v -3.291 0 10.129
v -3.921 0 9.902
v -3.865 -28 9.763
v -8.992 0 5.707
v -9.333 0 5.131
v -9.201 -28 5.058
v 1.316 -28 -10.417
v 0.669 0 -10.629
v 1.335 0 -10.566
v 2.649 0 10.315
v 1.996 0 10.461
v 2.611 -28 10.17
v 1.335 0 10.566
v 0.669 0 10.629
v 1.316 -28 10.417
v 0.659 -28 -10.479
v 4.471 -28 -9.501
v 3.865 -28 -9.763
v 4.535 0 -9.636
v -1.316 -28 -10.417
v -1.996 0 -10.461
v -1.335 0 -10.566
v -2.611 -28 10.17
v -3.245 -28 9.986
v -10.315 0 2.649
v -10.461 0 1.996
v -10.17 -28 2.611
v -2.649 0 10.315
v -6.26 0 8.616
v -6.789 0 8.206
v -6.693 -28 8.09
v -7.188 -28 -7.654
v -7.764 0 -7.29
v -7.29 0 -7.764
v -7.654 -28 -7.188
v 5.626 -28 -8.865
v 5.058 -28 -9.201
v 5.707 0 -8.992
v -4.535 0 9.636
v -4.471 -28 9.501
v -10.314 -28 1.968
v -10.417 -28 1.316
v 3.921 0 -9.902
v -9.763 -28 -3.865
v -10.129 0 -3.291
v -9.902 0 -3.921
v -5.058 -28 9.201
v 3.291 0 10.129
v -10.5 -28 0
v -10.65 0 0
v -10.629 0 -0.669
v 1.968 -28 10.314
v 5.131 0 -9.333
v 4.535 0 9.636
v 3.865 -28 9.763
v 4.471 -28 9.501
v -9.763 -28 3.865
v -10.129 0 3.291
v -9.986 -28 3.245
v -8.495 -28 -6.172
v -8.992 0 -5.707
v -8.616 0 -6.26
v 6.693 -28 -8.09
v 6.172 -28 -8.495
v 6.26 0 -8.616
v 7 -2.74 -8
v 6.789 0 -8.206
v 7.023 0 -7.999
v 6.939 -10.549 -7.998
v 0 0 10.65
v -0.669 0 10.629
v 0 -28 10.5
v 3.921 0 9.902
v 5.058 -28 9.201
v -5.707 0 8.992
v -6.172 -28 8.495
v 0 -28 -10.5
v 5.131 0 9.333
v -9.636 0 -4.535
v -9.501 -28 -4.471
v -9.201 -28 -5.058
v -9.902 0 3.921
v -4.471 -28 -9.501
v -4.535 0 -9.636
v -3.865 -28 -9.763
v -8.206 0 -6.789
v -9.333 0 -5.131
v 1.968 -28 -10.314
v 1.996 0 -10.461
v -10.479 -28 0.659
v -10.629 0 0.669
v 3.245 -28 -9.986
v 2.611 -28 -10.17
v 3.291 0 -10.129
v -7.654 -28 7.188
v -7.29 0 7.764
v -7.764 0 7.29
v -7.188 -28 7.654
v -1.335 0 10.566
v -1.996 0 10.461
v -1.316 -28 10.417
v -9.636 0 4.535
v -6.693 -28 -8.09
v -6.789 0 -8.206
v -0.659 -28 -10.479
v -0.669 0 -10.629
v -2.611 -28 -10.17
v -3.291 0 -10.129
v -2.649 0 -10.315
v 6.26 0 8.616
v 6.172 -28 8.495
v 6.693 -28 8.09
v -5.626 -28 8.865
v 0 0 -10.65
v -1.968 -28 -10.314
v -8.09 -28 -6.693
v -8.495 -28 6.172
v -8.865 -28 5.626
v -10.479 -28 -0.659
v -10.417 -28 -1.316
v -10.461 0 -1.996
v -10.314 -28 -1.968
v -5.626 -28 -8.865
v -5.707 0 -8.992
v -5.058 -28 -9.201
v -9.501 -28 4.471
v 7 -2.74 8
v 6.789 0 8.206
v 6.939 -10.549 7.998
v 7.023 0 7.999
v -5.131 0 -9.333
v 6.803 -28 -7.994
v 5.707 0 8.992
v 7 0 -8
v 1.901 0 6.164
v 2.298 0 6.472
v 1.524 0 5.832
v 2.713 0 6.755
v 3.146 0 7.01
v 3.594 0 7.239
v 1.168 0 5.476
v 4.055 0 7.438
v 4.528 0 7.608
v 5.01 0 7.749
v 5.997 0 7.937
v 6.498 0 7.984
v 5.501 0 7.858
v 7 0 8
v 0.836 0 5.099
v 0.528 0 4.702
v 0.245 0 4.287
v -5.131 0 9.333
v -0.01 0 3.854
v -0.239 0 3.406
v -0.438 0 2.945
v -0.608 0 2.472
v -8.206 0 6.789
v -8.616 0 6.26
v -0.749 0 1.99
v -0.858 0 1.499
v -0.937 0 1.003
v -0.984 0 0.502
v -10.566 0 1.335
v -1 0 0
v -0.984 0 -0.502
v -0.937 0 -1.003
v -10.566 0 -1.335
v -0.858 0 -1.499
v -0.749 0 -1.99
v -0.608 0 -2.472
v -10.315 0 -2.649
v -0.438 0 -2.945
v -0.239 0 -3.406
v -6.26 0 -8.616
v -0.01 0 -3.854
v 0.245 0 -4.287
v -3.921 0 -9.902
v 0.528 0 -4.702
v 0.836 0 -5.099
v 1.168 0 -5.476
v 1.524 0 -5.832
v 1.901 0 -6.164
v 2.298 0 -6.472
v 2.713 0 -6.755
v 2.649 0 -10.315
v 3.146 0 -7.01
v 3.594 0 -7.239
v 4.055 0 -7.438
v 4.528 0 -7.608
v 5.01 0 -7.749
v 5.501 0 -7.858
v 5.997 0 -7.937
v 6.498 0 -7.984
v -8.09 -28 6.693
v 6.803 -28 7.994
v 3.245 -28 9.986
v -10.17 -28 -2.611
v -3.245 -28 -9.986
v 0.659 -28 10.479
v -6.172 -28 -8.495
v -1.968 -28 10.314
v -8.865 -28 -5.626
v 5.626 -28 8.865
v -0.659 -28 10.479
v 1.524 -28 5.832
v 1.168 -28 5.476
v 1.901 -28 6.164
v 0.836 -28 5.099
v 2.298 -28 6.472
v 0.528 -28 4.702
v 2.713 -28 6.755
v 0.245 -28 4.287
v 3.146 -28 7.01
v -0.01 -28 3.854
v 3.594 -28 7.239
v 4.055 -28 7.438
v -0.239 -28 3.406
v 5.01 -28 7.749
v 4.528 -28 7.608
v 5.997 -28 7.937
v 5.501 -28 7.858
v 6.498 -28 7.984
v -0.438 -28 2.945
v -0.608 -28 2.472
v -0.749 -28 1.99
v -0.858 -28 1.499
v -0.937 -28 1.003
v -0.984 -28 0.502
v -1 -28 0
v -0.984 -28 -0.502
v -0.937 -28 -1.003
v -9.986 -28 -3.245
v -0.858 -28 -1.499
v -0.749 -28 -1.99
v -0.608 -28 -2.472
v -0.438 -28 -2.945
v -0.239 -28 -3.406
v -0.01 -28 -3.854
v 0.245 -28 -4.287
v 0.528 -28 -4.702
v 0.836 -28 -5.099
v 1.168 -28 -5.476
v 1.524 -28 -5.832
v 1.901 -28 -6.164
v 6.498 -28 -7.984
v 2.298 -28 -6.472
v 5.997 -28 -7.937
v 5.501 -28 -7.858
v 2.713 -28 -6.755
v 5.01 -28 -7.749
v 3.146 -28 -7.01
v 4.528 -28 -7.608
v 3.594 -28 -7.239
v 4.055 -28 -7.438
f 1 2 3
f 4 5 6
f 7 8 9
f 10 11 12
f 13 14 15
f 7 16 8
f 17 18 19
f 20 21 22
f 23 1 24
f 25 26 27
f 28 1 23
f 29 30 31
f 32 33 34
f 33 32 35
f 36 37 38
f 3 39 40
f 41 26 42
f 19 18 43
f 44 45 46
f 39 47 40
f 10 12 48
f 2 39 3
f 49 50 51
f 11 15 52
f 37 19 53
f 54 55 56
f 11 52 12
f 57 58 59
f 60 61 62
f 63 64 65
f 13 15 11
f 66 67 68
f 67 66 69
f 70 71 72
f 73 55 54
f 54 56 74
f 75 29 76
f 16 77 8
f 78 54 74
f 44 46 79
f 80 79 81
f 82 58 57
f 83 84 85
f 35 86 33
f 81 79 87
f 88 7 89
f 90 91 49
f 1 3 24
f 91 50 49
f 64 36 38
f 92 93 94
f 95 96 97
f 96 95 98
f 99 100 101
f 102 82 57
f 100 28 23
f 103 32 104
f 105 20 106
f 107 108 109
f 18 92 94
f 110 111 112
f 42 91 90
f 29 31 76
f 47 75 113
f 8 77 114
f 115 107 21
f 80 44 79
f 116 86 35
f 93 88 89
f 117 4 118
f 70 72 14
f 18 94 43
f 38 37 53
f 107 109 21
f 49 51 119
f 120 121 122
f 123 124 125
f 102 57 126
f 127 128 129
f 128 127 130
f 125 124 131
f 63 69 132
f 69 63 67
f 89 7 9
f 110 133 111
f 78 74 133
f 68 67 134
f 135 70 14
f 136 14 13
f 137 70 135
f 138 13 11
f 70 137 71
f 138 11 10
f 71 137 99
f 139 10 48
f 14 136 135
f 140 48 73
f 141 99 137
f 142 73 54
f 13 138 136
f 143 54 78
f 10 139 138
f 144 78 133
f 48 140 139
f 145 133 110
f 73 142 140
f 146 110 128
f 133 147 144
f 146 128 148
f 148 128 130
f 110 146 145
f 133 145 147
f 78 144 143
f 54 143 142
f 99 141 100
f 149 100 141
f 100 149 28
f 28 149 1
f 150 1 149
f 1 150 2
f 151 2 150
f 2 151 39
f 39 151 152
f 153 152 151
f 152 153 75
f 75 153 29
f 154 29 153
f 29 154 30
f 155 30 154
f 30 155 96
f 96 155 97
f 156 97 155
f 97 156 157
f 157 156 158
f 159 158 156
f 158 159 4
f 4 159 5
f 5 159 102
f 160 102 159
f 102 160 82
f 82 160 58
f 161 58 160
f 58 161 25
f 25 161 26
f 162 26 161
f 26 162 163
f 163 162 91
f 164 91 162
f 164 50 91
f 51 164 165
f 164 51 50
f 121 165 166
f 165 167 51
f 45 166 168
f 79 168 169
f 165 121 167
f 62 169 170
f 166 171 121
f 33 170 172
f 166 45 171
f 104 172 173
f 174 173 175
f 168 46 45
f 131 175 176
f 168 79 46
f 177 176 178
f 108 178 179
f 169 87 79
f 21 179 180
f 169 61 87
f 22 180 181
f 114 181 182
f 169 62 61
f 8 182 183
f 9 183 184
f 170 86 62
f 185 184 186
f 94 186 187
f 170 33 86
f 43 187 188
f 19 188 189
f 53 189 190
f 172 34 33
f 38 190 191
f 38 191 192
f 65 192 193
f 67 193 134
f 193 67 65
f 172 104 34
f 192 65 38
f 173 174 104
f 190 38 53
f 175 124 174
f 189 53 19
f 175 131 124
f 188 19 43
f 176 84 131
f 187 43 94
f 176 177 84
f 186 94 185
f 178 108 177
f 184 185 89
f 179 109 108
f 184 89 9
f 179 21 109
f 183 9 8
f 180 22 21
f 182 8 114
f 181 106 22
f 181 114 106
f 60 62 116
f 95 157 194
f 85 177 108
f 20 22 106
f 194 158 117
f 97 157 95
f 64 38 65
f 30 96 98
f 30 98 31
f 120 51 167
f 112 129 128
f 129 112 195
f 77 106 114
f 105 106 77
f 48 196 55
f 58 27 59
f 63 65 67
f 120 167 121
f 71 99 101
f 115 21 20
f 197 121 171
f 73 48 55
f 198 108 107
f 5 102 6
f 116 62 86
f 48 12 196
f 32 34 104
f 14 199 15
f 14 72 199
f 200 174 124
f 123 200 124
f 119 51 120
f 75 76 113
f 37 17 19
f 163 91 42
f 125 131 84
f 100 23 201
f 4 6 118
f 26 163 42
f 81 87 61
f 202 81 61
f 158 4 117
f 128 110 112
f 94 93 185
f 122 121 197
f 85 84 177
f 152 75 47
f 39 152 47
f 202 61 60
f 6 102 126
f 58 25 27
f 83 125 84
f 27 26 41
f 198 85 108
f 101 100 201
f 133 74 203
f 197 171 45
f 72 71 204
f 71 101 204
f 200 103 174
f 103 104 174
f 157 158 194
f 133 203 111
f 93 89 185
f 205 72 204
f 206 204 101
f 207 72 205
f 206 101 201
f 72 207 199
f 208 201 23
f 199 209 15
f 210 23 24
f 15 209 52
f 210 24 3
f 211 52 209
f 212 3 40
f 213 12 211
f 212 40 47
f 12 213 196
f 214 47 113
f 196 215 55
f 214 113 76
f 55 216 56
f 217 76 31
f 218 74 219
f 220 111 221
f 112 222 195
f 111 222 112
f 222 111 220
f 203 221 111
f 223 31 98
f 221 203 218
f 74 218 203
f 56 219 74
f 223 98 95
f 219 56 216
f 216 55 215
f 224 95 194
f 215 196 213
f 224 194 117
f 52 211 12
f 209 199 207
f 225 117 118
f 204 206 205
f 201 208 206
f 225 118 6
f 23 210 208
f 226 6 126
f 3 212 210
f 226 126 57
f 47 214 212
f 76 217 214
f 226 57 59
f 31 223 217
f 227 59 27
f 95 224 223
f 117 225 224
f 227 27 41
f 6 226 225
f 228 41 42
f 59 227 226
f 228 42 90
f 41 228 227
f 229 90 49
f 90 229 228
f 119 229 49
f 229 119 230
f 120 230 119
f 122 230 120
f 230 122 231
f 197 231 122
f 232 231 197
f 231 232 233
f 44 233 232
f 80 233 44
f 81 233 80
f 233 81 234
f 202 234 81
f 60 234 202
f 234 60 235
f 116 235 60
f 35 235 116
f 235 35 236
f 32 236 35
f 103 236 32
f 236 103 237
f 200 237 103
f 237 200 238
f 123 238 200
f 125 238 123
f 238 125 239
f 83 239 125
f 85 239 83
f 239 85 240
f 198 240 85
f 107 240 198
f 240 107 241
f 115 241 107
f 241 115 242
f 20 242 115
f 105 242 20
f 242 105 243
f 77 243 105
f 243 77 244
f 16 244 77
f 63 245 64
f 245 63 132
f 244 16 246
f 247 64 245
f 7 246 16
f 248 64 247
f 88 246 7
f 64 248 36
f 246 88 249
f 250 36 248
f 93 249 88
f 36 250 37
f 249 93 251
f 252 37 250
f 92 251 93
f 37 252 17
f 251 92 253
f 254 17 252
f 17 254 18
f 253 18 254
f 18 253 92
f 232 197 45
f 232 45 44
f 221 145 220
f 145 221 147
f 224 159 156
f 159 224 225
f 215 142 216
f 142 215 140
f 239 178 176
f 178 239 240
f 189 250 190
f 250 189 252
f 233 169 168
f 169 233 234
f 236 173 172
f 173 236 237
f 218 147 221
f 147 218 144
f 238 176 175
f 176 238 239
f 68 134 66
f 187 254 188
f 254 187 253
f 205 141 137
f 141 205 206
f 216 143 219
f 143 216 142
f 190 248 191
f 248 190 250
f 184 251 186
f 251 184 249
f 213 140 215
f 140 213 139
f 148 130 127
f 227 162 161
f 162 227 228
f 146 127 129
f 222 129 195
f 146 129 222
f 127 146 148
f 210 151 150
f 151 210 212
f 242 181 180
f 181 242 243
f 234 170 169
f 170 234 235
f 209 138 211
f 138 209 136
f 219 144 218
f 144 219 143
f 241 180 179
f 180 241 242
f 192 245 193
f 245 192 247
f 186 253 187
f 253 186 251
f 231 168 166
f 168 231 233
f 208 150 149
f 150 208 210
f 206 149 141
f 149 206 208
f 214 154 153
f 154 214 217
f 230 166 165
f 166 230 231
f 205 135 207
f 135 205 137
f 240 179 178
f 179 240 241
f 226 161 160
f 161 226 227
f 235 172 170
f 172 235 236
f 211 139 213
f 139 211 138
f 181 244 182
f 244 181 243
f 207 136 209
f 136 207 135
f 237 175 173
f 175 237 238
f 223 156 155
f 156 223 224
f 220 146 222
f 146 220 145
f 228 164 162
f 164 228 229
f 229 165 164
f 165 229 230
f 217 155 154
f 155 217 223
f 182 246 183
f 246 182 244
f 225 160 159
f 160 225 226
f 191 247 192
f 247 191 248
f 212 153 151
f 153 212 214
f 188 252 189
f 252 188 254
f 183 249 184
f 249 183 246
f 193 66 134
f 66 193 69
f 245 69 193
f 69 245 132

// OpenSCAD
difference(){
	union(){

        translate([0,0,0]){
            rotate([90,0,0]){
                cylinder(h=28, r1=21.3/2,  r2=21/2, $fn=100, center=false);
            }
        }       


            }
            union() {

                translate([7,1,0]){
                    rotate([90,0,0]){
                        cylinder(h=30, r=16/2, $fn=100, center=false);
                    }
                }       

           

            }
        }
